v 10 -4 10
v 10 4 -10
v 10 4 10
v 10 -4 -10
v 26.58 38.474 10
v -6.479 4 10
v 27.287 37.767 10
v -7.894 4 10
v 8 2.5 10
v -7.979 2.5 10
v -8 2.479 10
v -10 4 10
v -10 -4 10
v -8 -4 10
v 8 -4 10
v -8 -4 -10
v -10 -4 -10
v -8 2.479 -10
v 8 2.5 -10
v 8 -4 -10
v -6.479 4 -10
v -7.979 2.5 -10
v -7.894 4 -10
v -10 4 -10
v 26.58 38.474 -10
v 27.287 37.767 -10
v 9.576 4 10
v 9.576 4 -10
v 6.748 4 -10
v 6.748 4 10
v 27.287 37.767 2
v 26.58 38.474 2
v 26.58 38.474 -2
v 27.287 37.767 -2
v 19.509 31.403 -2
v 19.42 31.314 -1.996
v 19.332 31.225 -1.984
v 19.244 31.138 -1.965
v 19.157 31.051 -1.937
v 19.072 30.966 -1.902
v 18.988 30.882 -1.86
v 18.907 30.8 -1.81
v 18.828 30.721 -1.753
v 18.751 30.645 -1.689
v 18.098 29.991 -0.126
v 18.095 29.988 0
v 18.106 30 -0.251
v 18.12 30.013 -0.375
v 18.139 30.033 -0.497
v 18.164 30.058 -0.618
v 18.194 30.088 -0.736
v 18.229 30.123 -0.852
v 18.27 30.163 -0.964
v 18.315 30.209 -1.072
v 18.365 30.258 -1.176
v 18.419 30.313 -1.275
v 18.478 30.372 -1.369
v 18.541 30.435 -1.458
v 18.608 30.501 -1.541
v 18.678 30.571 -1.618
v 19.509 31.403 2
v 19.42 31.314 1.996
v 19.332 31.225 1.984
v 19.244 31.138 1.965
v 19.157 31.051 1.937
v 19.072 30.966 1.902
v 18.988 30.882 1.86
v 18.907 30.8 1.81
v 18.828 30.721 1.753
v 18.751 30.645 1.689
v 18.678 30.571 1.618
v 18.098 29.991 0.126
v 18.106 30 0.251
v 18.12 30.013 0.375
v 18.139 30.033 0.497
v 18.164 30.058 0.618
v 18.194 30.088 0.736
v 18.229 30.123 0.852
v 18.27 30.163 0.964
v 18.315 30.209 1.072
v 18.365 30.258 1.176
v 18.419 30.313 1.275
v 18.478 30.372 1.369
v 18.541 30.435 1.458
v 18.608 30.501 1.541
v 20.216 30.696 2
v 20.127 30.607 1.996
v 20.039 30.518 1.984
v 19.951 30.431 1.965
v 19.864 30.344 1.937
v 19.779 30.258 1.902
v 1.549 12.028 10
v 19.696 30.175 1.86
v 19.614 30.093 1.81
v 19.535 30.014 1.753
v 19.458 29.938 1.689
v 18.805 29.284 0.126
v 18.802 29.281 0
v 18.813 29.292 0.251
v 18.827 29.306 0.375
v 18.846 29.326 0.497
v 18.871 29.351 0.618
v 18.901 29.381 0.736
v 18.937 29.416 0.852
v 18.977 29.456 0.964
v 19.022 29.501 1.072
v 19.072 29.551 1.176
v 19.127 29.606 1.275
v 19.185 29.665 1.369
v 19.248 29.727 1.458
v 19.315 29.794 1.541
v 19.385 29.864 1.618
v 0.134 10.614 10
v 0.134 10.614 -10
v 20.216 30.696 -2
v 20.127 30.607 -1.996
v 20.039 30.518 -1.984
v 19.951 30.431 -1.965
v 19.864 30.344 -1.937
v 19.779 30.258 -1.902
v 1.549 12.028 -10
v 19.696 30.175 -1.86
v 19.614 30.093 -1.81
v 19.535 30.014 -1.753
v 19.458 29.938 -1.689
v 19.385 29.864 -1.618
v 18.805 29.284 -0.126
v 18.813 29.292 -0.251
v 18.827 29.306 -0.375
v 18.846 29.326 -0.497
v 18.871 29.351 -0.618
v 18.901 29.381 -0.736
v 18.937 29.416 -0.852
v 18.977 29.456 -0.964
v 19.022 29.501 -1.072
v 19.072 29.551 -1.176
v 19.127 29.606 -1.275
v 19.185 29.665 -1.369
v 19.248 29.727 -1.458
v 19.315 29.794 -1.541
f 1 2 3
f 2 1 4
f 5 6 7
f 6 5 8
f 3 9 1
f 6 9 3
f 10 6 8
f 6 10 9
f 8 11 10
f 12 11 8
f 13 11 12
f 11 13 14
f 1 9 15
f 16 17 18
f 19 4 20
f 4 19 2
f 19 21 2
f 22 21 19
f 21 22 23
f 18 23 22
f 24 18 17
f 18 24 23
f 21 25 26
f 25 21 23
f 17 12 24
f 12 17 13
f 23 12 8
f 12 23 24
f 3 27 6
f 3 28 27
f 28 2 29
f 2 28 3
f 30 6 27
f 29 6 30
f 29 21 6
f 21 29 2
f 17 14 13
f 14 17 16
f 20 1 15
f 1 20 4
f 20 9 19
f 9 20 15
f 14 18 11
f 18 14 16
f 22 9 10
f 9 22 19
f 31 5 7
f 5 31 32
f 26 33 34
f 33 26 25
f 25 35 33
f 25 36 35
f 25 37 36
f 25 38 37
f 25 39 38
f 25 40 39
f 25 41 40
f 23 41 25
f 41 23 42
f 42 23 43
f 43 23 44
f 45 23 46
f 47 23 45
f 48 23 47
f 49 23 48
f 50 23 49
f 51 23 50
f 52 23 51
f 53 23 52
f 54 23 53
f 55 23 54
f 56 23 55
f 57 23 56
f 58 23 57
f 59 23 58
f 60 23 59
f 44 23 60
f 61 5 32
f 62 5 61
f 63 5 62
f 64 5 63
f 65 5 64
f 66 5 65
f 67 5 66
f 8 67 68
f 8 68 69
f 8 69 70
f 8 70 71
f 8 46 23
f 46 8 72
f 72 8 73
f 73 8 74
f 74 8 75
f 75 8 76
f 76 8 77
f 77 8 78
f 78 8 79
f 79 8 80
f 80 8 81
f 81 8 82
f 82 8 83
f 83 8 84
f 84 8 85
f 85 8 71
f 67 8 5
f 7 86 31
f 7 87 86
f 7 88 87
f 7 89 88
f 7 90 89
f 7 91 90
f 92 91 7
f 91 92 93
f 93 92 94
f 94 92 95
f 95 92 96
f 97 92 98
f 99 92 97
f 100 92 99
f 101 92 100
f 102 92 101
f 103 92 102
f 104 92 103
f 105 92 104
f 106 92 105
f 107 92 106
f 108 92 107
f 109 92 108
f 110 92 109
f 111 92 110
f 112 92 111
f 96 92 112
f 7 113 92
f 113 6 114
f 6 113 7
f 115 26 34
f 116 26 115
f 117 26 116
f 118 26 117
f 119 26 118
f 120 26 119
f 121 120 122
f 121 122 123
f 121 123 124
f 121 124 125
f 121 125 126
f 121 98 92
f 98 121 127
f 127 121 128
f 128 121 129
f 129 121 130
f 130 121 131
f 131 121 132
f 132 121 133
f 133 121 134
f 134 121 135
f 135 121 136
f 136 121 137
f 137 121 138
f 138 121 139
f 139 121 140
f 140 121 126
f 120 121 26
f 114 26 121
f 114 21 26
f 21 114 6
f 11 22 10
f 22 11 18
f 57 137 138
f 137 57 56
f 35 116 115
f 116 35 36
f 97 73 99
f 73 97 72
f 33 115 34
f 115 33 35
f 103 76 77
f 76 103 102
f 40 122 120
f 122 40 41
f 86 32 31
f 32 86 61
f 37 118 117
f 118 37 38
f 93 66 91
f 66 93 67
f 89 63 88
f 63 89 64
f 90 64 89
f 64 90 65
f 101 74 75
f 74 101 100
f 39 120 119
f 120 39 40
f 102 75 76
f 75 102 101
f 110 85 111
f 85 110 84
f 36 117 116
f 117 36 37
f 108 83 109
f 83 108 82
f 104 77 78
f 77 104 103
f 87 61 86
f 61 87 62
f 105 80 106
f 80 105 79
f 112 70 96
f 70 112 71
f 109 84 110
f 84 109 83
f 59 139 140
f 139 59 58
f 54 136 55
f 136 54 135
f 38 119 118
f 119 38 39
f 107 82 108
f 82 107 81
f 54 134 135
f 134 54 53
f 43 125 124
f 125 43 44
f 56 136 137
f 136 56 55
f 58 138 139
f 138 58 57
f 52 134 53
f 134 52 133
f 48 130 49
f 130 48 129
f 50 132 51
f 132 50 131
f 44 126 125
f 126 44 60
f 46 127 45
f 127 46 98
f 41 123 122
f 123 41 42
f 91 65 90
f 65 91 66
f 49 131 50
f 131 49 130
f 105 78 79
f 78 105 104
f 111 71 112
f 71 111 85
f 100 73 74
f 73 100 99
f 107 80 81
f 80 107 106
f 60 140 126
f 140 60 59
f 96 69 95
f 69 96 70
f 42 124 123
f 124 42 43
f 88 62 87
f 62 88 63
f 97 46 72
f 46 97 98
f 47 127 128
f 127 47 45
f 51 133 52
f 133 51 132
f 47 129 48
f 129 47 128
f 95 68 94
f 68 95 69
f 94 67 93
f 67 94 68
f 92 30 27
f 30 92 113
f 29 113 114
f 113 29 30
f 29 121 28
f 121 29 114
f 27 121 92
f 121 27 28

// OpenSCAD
    union() {
        union() {
            difference(){
                color("blue") cube ([20, 8, 20], center=true);
                color("red") translate ([0, -1, 0]) cube ([16, 7, 200], center=true);
            }
        }

        color("pink")
            rotate(a=45)
                translate([-4, 7.41, -10]) difference() {
                    cube ([50, 1, 20]);
                    hull(){
                        translate([60, 0, 10]) rotate([90, 0, 0]) cylinder (h = 10, r = 2, $fn = 100, center=true);
                        translate([40, 0, 10]) rotate([90, 0, 0]) cylinder (h = 10, r = 2, $fn = 100, center=true);
                    }
                }

        color("orange") 
            rotate(a=135) 
                translate([-4, -9.6, -10]) 
                    cube ([12, 2, 20]);
    }
